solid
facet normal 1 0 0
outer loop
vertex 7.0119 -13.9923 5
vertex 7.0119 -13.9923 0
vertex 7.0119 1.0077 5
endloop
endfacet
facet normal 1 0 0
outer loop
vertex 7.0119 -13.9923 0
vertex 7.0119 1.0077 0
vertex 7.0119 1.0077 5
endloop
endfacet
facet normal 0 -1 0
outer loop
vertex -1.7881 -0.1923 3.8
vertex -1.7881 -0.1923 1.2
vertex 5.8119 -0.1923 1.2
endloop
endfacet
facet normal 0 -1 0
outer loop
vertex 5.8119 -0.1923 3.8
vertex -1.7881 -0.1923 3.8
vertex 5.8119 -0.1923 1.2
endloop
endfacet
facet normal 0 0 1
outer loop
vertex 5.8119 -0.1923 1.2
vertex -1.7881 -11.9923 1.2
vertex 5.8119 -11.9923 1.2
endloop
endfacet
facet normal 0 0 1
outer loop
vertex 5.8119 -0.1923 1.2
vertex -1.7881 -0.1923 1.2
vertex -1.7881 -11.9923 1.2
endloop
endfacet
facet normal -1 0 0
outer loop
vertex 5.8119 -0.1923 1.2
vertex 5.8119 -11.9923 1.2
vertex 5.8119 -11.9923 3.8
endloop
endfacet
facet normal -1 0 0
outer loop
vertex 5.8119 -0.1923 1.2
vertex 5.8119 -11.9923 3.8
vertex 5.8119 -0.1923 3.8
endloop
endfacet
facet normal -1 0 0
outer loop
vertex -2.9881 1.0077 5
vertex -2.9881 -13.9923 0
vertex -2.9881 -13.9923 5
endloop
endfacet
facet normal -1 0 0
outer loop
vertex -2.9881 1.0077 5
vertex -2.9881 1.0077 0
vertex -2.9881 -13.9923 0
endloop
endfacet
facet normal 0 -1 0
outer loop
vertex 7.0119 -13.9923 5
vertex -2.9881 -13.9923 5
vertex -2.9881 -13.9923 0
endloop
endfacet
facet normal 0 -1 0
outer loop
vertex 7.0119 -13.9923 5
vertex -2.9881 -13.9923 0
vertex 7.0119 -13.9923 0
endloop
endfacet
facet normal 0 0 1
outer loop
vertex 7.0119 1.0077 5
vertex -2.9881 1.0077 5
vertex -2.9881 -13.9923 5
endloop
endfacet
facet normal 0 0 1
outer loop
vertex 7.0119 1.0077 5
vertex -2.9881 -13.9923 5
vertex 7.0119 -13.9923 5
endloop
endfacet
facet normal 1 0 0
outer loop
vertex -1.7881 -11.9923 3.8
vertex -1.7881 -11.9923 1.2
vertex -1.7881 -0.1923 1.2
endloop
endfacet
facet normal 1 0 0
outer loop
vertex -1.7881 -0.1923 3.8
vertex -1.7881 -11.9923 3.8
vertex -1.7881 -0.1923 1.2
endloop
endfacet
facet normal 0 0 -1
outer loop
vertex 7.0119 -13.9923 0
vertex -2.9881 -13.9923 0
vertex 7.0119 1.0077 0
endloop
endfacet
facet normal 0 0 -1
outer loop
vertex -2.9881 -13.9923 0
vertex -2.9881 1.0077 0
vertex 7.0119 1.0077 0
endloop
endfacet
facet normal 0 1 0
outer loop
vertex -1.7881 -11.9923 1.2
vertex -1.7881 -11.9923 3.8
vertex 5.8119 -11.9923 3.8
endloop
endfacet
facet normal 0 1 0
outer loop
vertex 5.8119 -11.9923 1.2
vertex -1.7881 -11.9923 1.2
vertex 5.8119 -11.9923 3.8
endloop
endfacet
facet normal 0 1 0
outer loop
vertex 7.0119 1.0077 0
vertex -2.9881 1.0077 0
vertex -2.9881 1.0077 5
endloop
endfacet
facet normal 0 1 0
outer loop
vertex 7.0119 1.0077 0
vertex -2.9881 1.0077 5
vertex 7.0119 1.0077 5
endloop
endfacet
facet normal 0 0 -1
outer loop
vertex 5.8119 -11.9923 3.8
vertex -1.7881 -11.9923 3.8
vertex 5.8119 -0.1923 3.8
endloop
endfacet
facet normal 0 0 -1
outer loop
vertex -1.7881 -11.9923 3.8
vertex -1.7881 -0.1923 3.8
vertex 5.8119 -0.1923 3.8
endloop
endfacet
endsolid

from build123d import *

# Parameters (mm, degrees)
F0_W     = 10
F0_H     = 13
F1_DEPTH = 5
F2_T     = -1.2
F3_W     = 10
F3_H     = 5
F4_DEPTH = 2


with BuildPart() as f1:
    # F0 (on Top) → F1 (new body)
    with BuildSketch(Plane.XY):
        with Locations((2.011857, -5.49226)):
            Rectangle(F0_W, F0_H)
    extrude(amount=F1_DEPTH)

    # F2
    f2_openings = [f1.faces().sort_by_distance(p)[0] for p in [
        (2.011857, -11.99226, 2.5),
    ]]
    offset(amount=F2_T, openings=f2_openings)

    # F3 (on face) → F4 (join)
    with BuildSketch(Plane.XZ.offset(11.99226)):
        with Locations((2.011857, 2.5)):
            Rectangle(F3_W, F3_H)
    extrude(amount=F4_DEPTH)


solid = f1.part
